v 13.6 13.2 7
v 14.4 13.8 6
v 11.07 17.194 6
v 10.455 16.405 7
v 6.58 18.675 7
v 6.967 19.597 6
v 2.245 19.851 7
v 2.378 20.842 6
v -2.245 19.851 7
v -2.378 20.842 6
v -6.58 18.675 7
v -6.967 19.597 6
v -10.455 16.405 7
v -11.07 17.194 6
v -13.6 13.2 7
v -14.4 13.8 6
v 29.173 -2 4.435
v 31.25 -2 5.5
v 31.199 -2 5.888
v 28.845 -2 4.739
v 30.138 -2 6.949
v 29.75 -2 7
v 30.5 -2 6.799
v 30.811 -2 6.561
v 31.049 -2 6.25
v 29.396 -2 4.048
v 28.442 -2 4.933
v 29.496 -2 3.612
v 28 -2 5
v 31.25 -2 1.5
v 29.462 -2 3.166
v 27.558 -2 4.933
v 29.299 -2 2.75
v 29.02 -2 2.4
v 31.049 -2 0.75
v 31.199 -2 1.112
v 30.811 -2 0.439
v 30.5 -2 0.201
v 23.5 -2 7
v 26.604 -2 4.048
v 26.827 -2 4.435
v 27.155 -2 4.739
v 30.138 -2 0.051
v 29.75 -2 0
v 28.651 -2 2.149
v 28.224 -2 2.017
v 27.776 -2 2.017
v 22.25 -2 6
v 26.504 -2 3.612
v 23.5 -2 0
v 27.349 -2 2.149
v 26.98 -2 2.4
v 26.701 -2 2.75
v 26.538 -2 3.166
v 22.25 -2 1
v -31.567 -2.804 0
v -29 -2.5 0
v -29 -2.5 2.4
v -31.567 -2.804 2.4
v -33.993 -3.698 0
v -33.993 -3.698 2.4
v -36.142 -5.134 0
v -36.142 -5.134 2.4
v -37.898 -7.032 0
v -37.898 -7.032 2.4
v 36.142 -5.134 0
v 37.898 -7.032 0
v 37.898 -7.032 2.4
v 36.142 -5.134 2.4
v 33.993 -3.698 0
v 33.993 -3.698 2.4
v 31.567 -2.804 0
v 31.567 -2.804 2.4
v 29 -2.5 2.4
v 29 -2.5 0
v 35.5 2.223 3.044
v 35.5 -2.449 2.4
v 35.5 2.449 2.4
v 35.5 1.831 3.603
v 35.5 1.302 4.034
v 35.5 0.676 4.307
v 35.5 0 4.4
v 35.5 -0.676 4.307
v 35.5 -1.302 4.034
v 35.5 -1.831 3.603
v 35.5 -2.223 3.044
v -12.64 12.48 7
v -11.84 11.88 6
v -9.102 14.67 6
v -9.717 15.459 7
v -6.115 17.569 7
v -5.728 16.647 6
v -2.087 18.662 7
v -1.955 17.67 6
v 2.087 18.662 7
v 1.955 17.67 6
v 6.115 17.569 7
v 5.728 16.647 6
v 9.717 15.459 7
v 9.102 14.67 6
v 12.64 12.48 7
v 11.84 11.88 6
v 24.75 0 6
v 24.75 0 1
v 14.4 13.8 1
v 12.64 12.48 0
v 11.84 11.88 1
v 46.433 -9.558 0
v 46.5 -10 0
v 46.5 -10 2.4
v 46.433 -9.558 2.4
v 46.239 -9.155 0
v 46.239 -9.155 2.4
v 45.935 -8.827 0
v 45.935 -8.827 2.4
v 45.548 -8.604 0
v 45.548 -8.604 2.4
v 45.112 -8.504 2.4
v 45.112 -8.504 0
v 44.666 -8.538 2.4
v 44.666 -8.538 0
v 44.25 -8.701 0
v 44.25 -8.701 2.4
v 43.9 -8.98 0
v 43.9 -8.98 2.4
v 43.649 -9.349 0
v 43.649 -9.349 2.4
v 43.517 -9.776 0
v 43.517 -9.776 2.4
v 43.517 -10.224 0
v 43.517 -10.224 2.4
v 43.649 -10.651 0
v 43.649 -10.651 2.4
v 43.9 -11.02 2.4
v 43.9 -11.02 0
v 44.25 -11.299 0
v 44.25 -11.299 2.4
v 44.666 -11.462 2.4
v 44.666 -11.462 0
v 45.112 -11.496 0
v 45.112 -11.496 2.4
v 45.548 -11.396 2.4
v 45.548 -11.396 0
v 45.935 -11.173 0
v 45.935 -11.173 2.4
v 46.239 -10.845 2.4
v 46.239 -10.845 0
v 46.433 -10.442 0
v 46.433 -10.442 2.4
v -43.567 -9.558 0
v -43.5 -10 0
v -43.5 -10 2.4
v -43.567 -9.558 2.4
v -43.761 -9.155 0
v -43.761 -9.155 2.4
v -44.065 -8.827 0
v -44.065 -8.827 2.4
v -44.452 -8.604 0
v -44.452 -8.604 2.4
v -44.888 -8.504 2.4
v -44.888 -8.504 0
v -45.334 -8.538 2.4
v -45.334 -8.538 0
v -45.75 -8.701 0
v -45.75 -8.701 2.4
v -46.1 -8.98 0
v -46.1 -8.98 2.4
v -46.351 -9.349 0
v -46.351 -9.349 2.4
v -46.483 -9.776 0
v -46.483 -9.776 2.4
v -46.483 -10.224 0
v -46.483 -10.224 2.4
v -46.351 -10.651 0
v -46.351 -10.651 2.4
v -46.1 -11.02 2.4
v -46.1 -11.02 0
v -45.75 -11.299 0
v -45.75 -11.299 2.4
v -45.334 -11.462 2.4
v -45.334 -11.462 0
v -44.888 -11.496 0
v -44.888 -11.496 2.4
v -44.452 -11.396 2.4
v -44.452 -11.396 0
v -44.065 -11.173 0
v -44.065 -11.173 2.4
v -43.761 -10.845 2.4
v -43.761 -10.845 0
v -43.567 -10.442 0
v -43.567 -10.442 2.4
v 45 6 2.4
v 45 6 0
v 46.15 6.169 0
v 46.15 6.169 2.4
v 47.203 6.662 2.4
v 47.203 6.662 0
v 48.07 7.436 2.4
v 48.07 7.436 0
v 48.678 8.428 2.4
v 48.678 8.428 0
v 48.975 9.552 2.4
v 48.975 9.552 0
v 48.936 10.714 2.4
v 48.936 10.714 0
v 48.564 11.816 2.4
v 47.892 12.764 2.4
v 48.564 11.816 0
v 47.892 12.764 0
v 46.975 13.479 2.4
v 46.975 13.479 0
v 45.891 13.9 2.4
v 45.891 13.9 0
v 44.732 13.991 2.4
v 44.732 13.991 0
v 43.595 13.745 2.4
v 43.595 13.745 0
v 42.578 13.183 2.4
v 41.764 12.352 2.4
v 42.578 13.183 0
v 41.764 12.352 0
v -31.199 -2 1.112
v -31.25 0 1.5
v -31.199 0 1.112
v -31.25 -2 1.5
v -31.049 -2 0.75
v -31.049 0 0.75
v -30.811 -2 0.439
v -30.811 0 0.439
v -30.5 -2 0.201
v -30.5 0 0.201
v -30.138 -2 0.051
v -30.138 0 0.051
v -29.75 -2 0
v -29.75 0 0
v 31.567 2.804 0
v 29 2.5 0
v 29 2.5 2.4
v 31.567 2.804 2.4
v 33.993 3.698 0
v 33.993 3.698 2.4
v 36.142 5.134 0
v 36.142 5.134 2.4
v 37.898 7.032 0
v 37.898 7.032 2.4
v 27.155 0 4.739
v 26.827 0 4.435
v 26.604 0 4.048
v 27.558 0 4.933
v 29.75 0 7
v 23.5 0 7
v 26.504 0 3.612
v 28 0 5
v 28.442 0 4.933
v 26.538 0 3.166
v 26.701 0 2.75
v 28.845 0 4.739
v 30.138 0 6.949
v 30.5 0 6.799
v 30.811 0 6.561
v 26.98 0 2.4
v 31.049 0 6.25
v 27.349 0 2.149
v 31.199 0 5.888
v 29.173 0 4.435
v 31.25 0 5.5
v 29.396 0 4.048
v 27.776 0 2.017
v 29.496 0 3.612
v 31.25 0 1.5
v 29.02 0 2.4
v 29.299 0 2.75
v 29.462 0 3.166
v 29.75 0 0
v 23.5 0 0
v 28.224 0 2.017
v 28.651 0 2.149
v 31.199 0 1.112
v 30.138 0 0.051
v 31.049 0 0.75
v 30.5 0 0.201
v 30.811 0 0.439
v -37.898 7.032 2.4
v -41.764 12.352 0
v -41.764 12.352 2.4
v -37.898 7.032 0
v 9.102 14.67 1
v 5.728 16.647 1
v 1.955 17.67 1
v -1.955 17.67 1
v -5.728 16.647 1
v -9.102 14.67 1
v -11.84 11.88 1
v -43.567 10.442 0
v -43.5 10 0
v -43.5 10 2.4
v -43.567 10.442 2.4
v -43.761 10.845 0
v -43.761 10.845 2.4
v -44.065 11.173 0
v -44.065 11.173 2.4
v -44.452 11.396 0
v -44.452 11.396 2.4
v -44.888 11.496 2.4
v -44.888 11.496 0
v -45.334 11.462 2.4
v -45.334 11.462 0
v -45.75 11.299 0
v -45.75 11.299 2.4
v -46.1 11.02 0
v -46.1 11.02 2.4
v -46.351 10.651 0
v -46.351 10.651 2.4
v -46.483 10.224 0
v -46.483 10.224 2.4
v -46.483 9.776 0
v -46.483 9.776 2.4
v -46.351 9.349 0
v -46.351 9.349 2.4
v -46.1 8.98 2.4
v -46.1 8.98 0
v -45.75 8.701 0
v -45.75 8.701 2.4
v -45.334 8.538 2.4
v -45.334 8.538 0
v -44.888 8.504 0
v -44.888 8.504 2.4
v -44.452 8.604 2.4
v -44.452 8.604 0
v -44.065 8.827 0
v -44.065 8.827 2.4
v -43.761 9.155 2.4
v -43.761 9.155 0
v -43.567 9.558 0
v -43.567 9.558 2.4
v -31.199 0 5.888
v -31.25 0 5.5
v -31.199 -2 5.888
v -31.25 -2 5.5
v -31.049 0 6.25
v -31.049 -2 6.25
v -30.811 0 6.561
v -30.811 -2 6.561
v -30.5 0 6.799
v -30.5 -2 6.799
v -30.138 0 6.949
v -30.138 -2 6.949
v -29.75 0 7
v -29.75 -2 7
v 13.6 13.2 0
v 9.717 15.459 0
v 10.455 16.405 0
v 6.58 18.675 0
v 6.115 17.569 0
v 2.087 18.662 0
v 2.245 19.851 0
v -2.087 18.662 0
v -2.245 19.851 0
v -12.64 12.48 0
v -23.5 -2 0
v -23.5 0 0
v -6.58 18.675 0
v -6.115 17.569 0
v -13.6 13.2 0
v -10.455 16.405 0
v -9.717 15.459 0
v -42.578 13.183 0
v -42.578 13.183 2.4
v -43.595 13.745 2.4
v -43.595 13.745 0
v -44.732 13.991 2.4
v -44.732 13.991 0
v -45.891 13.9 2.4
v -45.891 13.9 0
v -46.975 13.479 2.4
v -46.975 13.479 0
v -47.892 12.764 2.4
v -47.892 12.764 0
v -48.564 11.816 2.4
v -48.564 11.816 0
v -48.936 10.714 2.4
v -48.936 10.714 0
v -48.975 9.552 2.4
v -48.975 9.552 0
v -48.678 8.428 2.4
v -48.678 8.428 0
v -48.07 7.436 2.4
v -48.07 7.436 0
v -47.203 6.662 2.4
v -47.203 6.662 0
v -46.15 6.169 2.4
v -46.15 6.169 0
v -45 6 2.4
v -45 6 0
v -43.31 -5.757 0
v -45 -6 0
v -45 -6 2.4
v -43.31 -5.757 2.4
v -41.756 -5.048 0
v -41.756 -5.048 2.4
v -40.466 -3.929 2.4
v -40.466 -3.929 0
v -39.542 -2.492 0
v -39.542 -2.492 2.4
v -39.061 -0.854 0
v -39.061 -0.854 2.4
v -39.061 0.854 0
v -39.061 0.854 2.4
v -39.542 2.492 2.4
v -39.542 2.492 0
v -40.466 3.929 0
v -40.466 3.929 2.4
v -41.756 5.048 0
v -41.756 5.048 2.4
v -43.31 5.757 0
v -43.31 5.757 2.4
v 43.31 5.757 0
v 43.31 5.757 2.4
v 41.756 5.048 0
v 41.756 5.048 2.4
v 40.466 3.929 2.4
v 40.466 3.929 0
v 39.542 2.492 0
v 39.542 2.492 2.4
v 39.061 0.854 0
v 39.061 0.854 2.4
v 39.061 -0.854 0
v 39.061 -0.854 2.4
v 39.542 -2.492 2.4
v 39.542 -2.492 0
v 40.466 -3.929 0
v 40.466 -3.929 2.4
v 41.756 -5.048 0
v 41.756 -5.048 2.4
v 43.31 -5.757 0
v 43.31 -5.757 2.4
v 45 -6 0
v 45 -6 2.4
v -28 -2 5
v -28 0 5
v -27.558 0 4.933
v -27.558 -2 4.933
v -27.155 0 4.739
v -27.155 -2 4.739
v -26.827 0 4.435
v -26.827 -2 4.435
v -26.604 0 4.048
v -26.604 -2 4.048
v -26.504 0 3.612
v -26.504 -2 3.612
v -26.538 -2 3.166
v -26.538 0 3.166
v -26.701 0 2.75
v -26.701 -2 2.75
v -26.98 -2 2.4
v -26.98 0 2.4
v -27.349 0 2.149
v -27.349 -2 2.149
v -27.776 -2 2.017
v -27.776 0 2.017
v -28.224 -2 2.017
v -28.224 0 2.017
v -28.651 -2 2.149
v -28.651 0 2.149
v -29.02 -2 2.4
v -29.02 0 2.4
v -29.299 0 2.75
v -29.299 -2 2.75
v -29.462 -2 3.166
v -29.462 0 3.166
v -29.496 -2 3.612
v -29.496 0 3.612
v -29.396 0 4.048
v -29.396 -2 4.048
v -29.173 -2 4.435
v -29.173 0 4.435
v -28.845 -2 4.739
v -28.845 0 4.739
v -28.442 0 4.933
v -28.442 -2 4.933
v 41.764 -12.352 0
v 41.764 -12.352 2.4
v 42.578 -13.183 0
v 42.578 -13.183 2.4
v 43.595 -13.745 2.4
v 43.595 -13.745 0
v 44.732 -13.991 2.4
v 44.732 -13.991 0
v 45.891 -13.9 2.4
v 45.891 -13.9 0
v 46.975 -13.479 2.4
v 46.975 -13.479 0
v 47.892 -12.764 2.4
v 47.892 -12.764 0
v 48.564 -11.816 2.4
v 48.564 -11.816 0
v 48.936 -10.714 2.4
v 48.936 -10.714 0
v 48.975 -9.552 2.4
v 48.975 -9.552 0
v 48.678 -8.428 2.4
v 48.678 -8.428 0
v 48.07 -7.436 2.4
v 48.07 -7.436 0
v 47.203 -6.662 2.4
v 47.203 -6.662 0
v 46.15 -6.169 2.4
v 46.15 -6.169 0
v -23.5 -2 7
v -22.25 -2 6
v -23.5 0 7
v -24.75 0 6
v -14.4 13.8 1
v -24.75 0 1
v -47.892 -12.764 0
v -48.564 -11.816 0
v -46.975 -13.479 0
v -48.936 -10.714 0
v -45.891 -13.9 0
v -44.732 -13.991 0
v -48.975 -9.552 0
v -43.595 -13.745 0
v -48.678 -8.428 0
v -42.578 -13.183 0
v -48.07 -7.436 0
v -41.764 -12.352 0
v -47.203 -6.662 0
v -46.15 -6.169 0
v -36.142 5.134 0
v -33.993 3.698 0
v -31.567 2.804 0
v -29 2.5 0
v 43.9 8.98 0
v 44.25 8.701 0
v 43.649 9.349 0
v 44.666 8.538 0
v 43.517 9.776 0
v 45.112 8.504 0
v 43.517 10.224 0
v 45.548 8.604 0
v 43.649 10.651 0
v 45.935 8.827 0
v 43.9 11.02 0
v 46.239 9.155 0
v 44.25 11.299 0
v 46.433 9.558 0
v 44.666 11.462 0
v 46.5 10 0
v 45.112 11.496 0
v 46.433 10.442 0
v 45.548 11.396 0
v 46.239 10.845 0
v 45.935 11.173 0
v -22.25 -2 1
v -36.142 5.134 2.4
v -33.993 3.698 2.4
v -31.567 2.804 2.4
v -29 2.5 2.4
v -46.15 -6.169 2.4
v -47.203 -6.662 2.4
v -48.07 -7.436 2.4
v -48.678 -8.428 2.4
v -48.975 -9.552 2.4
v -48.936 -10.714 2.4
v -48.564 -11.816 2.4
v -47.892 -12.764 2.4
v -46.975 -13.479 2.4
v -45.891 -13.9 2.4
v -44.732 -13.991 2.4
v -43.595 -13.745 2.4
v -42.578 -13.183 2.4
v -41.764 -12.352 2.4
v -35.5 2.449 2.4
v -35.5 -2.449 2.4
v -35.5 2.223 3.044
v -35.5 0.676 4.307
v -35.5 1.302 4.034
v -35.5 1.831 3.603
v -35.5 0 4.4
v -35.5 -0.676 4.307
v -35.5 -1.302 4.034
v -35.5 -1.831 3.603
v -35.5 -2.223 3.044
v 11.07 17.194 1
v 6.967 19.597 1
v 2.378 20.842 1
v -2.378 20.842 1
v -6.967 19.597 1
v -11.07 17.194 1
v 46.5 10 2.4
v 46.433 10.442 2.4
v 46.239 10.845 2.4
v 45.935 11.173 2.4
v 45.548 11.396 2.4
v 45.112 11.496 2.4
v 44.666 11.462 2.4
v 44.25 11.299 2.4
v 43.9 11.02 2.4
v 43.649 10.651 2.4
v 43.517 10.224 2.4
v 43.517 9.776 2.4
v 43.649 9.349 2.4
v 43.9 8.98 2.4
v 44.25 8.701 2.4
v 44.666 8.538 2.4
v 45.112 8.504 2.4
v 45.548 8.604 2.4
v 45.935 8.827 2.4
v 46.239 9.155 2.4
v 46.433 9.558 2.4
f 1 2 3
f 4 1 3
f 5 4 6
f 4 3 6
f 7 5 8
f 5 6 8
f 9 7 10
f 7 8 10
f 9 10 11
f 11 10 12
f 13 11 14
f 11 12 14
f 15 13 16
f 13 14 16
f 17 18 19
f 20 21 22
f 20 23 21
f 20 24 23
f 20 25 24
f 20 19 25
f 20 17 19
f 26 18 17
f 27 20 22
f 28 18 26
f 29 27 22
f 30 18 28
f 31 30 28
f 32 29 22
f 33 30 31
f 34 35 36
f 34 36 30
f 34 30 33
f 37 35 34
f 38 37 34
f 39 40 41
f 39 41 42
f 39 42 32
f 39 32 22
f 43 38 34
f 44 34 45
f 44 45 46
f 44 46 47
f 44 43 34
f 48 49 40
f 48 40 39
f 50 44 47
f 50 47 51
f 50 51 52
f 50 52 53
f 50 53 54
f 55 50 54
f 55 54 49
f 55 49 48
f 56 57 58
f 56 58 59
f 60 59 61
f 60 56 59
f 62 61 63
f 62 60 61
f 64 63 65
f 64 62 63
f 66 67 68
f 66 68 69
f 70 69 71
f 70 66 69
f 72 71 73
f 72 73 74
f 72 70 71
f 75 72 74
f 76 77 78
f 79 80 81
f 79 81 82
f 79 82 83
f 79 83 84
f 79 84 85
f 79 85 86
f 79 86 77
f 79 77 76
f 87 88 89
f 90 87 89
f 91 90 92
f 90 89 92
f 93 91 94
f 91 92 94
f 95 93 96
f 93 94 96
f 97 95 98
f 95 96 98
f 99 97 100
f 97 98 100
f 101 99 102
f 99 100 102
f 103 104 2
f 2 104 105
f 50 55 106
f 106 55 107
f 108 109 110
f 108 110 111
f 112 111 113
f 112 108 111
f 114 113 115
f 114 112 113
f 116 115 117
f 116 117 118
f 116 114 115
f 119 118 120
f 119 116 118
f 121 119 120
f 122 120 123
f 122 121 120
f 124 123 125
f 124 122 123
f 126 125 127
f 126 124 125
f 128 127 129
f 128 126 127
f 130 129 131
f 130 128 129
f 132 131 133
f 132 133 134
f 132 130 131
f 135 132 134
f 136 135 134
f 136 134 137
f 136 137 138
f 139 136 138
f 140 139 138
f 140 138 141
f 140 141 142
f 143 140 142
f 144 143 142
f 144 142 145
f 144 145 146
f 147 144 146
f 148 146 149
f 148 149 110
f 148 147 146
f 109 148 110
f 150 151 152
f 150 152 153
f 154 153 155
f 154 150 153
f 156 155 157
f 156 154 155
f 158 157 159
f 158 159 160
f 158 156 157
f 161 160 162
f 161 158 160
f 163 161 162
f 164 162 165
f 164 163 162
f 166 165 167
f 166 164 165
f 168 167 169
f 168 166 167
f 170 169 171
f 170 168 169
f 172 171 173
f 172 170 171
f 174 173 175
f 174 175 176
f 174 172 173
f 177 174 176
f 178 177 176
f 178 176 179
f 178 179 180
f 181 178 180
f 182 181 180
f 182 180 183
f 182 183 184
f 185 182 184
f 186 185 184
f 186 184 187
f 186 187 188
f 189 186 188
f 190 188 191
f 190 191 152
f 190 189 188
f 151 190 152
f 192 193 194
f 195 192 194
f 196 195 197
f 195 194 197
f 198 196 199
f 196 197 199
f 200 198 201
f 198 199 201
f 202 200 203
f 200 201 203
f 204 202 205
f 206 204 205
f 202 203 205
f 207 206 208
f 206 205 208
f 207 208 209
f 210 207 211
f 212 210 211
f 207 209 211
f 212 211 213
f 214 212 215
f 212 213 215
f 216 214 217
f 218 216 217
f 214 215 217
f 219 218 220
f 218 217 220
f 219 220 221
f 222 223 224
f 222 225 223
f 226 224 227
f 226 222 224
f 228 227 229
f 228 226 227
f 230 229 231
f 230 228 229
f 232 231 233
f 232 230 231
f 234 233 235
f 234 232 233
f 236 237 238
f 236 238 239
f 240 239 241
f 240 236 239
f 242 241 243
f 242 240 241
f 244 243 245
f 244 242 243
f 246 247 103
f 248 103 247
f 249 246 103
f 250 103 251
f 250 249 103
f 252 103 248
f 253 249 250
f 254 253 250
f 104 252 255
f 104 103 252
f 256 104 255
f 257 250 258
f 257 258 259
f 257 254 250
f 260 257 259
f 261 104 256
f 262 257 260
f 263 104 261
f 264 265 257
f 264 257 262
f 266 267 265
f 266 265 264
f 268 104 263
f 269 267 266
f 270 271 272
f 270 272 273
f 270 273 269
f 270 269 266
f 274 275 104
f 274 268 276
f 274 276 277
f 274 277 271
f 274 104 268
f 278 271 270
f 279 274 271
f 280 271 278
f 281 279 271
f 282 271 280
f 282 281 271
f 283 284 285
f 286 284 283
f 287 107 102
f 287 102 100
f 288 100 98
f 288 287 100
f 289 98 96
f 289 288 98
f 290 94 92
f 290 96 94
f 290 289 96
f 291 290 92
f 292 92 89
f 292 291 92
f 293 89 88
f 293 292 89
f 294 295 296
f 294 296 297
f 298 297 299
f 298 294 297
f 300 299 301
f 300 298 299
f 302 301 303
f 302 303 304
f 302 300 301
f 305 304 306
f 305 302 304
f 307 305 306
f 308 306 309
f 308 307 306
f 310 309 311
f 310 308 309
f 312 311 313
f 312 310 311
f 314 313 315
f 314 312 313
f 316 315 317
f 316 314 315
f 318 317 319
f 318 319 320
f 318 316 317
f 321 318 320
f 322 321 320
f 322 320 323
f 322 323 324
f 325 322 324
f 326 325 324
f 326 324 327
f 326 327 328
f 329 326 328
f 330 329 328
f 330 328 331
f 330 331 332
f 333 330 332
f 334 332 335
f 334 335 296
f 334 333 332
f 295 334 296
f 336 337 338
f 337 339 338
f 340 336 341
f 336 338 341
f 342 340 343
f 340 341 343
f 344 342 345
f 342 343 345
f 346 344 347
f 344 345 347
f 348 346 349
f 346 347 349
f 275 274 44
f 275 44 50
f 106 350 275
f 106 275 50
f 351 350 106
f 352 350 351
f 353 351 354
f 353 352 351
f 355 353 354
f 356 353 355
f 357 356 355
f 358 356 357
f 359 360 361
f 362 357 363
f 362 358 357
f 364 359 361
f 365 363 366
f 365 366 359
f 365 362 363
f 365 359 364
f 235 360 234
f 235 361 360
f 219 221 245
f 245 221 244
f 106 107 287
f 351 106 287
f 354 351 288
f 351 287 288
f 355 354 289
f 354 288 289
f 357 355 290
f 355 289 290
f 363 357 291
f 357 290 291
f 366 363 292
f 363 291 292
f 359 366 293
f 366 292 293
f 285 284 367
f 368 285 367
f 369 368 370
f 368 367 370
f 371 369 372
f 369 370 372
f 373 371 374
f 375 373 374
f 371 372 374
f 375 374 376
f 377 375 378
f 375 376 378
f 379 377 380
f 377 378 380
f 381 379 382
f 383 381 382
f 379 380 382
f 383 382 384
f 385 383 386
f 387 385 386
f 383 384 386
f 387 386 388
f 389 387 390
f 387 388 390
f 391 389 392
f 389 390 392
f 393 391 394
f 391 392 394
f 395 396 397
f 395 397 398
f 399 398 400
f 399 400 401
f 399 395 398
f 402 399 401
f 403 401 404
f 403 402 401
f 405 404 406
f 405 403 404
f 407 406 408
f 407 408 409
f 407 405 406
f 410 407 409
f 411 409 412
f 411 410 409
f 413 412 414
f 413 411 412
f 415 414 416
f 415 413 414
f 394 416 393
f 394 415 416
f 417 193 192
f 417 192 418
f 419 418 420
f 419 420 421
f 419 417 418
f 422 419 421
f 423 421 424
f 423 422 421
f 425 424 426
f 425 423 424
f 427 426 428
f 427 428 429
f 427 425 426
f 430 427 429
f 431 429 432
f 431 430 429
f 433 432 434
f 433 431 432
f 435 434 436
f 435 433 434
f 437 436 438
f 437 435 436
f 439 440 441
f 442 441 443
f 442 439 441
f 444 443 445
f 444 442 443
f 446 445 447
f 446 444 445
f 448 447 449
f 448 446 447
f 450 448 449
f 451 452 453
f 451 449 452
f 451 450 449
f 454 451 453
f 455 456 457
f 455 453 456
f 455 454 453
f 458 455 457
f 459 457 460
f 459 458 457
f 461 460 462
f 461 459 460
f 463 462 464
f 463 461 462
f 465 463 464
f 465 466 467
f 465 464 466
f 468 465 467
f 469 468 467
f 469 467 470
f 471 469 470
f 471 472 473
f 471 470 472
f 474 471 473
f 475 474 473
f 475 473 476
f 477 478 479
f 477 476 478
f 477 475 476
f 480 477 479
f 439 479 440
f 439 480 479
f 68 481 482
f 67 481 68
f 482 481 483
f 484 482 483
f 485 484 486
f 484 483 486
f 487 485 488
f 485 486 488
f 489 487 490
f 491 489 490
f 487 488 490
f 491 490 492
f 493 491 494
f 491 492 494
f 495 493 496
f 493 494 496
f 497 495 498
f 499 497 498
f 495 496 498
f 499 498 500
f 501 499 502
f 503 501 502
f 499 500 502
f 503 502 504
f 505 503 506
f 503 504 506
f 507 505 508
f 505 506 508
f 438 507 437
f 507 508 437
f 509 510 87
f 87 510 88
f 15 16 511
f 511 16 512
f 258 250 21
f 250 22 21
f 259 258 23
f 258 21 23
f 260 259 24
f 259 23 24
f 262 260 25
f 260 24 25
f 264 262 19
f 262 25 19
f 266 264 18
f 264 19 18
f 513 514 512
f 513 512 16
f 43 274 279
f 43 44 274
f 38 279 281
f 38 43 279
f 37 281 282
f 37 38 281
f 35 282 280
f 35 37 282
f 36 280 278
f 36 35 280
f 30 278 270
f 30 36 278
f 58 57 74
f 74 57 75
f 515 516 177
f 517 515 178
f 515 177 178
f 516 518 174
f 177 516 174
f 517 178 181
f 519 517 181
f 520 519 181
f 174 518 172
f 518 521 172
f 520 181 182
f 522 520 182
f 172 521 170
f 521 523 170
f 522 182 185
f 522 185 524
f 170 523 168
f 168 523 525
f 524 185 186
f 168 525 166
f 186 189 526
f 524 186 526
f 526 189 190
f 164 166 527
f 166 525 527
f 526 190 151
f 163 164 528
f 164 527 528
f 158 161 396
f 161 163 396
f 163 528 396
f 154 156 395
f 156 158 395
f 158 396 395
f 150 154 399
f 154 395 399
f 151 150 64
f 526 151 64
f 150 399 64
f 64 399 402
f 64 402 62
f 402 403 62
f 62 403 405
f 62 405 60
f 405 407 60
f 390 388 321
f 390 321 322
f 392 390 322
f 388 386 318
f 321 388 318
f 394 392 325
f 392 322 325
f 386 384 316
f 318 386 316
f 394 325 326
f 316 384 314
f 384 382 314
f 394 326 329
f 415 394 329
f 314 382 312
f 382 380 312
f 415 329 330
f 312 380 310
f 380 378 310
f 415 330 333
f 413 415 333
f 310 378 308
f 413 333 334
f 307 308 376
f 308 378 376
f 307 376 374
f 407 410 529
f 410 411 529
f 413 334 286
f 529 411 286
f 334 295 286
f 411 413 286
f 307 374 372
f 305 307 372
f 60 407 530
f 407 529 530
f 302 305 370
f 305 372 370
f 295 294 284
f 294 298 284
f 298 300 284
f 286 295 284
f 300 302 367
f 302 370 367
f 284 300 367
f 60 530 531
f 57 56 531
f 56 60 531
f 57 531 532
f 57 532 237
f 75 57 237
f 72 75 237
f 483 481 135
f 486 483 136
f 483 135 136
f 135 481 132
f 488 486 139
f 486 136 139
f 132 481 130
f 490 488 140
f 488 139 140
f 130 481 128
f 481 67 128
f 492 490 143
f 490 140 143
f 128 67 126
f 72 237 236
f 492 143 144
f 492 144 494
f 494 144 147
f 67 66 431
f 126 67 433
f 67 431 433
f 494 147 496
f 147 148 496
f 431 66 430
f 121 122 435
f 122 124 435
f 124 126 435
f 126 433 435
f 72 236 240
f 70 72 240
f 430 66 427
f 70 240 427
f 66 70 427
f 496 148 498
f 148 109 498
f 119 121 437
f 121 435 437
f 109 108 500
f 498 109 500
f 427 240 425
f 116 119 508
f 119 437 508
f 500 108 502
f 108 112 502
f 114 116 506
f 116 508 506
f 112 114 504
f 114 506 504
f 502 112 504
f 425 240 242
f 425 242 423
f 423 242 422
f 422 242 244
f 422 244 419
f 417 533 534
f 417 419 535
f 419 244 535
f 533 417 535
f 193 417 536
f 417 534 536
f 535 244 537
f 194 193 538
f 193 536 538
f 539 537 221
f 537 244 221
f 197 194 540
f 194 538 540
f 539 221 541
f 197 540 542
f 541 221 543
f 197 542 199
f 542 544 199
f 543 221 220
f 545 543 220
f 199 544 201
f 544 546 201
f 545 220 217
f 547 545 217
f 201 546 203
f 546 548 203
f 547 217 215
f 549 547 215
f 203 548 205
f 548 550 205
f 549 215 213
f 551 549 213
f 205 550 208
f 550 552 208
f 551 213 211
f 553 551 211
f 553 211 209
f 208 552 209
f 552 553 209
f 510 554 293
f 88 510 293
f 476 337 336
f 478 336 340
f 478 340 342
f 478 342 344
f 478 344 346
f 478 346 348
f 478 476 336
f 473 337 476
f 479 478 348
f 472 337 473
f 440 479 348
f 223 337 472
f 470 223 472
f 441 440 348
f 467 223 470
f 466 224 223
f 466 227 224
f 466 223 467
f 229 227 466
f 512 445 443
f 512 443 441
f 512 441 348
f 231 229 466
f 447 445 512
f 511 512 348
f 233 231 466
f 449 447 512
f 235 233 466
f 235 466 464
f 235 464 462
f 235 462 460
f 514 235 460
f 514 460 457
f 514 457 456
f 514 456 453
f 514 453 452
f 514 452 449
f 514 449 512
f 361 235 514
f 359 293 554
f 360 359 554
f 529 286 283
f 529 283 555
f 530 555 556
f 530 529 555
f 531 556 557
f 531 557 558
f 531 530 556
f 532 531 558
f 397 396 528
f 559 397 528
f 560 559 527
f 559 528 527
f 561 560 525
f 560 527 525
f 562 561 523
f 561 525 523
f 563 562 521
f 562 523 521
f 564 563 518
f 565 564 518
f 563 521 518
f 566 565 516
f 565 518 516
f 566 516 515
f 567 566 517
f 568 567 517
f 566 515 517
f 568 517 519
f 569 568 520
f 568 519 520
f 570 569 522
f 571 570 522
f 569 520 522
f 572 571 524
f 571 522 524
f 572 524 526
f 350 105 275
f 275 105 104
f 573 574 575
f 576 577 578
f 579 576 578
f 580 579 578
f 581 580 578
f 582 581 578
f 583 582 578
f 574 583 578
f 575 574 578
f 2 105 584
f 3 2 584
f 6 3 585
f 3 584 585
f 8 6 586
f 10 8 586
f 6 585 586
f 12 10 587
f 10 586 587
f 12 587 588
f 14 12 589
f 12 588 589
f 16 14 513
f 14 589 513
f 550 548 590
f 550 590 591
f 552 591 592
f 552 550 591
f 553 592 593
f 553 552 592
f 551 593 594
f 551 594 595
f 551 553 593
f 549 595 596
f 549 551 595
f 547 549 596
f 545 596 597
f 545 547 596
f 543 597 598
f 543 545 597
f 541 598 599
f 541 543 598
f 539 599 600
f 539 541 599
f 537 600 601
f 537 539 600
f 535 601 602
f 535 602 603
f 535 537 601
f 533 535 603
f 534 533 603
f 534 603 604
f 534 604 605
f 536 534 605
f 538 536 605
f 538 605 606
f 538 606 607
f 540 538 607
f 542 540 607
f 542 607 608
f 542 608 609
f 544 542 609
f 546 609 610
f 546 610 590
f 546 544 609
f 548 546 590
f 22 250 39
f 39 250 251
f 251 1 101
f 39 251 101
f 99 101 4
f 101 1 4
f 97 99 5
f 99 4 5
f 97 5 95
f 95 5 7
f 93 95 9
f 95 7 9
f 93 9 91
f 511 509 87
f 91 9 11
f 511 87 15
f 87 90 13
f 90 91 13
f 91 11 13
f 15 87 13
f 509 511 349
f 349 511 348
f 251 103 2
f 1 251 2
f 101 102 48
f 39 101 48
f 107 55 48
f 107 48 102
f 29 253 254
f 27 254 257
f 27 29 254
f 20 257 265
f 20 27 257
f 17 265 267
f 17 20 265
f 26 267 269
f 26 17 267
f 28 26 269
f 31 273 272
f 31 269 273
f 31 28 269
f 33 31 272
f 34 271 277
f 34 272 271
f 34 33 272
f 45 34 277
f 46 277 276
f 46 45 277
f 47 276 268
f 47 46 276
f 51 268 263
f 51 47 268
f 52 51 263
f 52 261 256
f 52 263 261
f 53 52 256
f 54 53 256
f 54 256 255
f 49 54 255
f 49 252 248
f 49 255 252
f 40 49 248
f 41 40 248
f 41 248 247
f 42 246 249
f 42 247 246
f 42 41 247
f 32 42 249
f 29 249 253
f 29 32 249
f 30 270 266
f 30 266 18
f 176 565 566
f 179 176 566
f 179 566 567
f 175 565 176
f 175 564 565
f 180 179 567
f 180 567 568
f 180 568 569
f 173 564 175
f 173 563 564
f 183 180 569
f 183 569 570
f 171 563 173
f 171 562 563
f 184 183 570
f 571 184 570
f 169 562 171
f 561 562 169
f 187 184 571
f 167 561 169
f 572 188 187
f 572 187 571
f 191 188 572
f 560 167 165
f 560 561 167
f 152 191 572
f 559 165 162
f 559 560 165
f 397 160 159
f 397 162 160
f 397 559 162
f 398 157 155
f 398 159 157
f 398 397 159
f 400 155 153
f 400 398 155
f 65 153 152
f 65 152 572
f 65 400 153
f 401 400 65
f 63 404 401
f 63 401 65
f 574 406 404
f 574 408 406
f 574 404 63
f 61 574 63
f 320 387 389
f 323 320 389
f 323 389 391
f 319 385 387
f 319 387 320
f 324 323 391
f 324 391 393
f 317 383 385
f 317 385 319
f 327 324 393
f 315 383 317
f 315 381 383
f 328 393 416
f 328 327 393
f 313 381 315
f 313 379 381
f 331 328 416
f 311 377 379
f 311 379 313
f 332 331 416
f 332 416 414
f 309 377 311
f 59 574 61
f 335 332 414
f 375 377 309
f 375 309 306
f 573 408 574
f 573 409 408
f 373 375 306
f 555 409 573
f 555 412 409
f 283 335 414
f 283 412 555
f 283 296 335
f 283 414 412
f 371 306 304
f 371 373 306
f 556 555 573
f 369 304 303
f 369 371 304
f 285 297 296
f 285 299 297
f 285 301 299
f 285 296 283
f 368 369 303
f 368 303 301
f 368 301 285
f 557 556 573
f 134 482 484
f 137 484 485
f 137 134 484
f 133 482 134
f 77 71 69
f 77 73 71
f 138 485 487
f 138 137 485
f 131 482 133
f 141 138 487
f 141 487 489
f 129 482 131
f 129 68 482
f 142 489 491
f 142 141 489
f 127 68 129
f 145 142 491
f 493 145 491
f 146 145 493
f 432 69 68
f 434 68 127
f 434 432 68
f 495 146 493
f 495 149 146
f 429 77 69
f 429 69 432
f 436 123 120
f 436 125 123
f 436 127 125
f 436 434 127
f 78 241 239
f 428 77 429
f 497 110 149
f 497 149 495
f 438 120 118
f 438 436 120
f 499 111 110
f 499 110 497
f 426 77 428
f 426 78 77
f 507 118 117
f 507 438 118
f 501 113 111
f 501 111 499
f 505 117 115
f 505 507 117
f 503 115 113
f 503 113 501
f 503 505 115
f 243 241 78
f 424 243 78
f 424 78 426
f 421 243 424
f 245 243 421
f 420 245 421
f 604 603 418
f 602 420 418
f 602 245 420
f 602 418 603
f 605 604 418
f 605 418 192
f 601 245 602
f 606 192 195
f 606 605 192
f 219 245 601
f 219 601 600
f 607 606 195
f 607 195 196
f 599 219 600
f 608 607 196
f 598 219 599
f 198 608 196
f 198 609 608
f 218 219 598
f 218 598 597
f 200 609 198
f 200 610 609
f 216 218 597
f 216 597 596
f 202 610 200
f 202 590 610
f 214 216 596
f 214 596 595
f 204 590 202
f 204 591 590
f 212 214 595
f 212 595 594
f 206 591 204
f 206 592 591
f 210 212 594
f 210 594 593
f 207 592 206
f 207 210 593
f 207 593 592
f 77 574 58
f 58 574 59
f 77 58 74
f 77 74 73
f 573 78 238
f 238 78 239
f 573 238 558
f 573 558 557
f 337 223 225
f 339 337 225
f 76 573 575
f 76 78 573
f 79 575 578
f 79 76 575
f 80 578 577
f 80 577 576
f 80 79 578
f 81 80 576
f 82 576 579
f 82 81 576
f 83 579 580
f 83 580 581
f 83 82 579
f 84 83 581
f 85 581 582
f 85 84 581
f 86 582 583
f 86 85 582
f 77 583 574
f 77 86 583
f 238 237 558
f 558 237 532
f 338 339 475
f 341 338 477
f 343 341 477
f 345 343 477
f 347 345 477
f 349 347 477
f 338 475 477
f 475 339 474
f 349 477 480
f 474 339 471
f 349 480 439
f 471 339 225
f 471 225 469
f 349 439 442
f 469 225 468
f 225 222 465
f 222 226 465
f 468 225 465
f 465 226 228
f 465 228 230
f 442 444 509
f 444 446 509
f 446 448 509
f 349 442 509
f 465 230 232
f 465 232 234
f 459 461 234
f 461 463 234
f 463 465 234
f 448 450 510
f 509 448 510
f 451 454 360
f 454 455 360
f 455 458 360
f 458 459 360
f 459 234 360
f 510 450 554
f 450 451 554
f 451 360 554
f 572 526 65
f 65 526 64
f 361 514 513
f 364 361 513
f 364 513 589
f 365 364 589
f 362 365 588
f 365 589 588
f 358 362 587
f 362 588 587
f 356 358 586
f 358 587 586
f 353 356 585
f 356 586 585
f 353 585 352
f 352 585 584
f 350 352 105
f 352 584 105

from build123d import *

# Parameters (mm, degrees)
PAD_DEPTH         = 7
SKETCH002_R       = 1.5
POCKET_DEPTH      = 0.001
POCKET_DEPTH_BACK = -23.001
FILLET_R          = 1.5
CHAMFER_SIZE      = 1
SKETCH003_R       = 1.5
PAD001_DEPTH      = 2.4
PAD002_DEPTH      = 35.5


with BuildPart() as turtle_fin:
    # Sketch001 → Pad (new body)
    with BuildSketch(Plane.XY):
        with BuildLine():
            Line((-31.25, 0), (-24.75, 0))
            Line((-24.75, 0), (-14.4, 13.8))
            ThreePointArc((14.4, 13.8), (0, 21), (-14.4, 13.8))
            Line((24.75, 0), (14.4, 13.8))
            Line((24.75, 0), (31.25, 0))
            Line((31.25, 0), (31.25, -2))
            Line((31.25, -2), (22.25, -2))
            Line((22.25, -2), (11.84, 11.88))
            ThreePointArc((11.84, 11.88), (0, 17.8), (-11.84, 11.88))
            Line((-22.25, -2), (-11.84, 11.88))
            Line((-31.25, -2), (-22.25, -2))
            Line((-31.25, 0), (-31.25, -2))
        make_face()
    extrude(amount=PAD_DEPTH)

    # Sketch002 (on Face8 of Pad) → Pocket (cut, two sides)
    with BuildSketch(Plane(origin=(0, -2, 3.5), x_dir=(0, 0, 1), z_dir=(0, 1, 0))) as pocket_sk:
        with Locations((0, 28)):
            Circle(SKETCH002_R)
        with Locations((0, -28)):
            Circle(SKETCH002_R)
    extrude(amount=-POCKET_DEPTH, mode=Mode.SUBTRACT)
    extrude(pocket_sk.sketch, amount=-POCKET_DEPTH_BACK, mode=Mode.SUBTRACT)

    # Fillet
    fillet_edges = [turtle_fin.edges().sort_by_distance(p)[0] for p in [
        (31.25, -1, 0),
        (31.25, -1, 7),
        (-31.25, -1, 0),
        (-31.25, -1, 7),
    ]]
    fillet(fillet_edges, radius=FILLET_R)

    # Chamfer
    chamfer_edges = [turtle_fin.edges().sort_by_distance(p)[0] for p in [
        (17.045, 4.94, 0),
        (0, 17.8, 0),
        (-17.045, 4.94, 0),
        (-17.045, 4.94, 7),
        (0, 17.8, 7),
        (17.045, 4.94, 7),
        (-19.575, 6.9, 0),
        (0, 21, 0),
        (19.575, 6.9, 0),
        (0, 21, 7),
        (-19.575, 6.9, 7),
        (19.575, 6.9, 7),
    ]]
    chamfer(chamfer_edges, length=CHAMFER_SIZE)


with BuildPart() as turtle_fin_v2:
    # Sketch003 → Pad001 (new body)
    with BuildSketch(Plane.XY):
        with BuildLine():
            ThreePointArc((41.764476, -12.351889), (48.564236, -11.81555), (45, -6))
            ThreePointArc((45, 6), (39, 0), (45, -6))
            ThreePointArc((45, 6), (48.564236, 11.81555), (41.764476, 12.351889))
            Line((41.764476, 12.351889), (37.897692, 7.032305))
            ThreePointArc((29, 2.5), (33.992762, 3.698351), (37.897692, 7.032305))
            Line((29, 2.5), (-29, 2.5))
            ThreePointArc((-37.897692, 7.032305), (-33.992762, 3.698351), (-29, 2.5))
            Line((-41.764476, 12.351889), (-37.897692, 7.032305))
            ThreePointArc((-41.764476, 12.351889), (-48.564236, 11.81555), (-45, 6))
            ThreePointArc((-45, -6), (-39, 0), (-45, 6))
            ThreePointArc((-45, -6), (-48.564236, -11.81555), (-41.764476, -12.351889))
            Line((-41.764476, -12.351889), (-37.897692, -7.032305))
            ThreePointArc((-29, -2.5), (-33.992762, -3.698351), (-37.897692, -7.032305))
            Line((-29, -2.5), (29, -2.5))
            ThreePointArc((37.897692, -7.032305), (33.992762, -3.698351), (29, -2.5))
            Line((41.764476, -12.351889), (37.897692, -7.032305))
        make_face()
        with Locations((-45, 10)):
            Circle(SKETCH003_R, mode=Mode.SUBTRACT)
        with Locations((-45, -10)):
            Circle(SKETCH003_R, mode=Mode.SUBTRACT)
        with Locations((45, 10)):
            Circle(SKETCH003_R, mode=Mode.SUBTRACT)
        with Locations((45, -10)):
            Circle(SKETCH003_R, mode=Mode.SUBTRACT)
    extrude(amount=PAD001_DEPTH)

    # Sketch004 → Pad002 (join, symmetric)
    with BuildSketch(Plane.YZ):
        with BuildLine():
            ThreePointArc((2.44949, 2.4), (0, 4.4), (-2.44949, 2.4))
            Line((2.44949, 2.4), (-2.44949, 2.4))
        make_face()
    extrude(amount=PAD002_DEPTH, both=True)


solid = Compound([turtle_fin.part, turtle_fin_v2.part])
